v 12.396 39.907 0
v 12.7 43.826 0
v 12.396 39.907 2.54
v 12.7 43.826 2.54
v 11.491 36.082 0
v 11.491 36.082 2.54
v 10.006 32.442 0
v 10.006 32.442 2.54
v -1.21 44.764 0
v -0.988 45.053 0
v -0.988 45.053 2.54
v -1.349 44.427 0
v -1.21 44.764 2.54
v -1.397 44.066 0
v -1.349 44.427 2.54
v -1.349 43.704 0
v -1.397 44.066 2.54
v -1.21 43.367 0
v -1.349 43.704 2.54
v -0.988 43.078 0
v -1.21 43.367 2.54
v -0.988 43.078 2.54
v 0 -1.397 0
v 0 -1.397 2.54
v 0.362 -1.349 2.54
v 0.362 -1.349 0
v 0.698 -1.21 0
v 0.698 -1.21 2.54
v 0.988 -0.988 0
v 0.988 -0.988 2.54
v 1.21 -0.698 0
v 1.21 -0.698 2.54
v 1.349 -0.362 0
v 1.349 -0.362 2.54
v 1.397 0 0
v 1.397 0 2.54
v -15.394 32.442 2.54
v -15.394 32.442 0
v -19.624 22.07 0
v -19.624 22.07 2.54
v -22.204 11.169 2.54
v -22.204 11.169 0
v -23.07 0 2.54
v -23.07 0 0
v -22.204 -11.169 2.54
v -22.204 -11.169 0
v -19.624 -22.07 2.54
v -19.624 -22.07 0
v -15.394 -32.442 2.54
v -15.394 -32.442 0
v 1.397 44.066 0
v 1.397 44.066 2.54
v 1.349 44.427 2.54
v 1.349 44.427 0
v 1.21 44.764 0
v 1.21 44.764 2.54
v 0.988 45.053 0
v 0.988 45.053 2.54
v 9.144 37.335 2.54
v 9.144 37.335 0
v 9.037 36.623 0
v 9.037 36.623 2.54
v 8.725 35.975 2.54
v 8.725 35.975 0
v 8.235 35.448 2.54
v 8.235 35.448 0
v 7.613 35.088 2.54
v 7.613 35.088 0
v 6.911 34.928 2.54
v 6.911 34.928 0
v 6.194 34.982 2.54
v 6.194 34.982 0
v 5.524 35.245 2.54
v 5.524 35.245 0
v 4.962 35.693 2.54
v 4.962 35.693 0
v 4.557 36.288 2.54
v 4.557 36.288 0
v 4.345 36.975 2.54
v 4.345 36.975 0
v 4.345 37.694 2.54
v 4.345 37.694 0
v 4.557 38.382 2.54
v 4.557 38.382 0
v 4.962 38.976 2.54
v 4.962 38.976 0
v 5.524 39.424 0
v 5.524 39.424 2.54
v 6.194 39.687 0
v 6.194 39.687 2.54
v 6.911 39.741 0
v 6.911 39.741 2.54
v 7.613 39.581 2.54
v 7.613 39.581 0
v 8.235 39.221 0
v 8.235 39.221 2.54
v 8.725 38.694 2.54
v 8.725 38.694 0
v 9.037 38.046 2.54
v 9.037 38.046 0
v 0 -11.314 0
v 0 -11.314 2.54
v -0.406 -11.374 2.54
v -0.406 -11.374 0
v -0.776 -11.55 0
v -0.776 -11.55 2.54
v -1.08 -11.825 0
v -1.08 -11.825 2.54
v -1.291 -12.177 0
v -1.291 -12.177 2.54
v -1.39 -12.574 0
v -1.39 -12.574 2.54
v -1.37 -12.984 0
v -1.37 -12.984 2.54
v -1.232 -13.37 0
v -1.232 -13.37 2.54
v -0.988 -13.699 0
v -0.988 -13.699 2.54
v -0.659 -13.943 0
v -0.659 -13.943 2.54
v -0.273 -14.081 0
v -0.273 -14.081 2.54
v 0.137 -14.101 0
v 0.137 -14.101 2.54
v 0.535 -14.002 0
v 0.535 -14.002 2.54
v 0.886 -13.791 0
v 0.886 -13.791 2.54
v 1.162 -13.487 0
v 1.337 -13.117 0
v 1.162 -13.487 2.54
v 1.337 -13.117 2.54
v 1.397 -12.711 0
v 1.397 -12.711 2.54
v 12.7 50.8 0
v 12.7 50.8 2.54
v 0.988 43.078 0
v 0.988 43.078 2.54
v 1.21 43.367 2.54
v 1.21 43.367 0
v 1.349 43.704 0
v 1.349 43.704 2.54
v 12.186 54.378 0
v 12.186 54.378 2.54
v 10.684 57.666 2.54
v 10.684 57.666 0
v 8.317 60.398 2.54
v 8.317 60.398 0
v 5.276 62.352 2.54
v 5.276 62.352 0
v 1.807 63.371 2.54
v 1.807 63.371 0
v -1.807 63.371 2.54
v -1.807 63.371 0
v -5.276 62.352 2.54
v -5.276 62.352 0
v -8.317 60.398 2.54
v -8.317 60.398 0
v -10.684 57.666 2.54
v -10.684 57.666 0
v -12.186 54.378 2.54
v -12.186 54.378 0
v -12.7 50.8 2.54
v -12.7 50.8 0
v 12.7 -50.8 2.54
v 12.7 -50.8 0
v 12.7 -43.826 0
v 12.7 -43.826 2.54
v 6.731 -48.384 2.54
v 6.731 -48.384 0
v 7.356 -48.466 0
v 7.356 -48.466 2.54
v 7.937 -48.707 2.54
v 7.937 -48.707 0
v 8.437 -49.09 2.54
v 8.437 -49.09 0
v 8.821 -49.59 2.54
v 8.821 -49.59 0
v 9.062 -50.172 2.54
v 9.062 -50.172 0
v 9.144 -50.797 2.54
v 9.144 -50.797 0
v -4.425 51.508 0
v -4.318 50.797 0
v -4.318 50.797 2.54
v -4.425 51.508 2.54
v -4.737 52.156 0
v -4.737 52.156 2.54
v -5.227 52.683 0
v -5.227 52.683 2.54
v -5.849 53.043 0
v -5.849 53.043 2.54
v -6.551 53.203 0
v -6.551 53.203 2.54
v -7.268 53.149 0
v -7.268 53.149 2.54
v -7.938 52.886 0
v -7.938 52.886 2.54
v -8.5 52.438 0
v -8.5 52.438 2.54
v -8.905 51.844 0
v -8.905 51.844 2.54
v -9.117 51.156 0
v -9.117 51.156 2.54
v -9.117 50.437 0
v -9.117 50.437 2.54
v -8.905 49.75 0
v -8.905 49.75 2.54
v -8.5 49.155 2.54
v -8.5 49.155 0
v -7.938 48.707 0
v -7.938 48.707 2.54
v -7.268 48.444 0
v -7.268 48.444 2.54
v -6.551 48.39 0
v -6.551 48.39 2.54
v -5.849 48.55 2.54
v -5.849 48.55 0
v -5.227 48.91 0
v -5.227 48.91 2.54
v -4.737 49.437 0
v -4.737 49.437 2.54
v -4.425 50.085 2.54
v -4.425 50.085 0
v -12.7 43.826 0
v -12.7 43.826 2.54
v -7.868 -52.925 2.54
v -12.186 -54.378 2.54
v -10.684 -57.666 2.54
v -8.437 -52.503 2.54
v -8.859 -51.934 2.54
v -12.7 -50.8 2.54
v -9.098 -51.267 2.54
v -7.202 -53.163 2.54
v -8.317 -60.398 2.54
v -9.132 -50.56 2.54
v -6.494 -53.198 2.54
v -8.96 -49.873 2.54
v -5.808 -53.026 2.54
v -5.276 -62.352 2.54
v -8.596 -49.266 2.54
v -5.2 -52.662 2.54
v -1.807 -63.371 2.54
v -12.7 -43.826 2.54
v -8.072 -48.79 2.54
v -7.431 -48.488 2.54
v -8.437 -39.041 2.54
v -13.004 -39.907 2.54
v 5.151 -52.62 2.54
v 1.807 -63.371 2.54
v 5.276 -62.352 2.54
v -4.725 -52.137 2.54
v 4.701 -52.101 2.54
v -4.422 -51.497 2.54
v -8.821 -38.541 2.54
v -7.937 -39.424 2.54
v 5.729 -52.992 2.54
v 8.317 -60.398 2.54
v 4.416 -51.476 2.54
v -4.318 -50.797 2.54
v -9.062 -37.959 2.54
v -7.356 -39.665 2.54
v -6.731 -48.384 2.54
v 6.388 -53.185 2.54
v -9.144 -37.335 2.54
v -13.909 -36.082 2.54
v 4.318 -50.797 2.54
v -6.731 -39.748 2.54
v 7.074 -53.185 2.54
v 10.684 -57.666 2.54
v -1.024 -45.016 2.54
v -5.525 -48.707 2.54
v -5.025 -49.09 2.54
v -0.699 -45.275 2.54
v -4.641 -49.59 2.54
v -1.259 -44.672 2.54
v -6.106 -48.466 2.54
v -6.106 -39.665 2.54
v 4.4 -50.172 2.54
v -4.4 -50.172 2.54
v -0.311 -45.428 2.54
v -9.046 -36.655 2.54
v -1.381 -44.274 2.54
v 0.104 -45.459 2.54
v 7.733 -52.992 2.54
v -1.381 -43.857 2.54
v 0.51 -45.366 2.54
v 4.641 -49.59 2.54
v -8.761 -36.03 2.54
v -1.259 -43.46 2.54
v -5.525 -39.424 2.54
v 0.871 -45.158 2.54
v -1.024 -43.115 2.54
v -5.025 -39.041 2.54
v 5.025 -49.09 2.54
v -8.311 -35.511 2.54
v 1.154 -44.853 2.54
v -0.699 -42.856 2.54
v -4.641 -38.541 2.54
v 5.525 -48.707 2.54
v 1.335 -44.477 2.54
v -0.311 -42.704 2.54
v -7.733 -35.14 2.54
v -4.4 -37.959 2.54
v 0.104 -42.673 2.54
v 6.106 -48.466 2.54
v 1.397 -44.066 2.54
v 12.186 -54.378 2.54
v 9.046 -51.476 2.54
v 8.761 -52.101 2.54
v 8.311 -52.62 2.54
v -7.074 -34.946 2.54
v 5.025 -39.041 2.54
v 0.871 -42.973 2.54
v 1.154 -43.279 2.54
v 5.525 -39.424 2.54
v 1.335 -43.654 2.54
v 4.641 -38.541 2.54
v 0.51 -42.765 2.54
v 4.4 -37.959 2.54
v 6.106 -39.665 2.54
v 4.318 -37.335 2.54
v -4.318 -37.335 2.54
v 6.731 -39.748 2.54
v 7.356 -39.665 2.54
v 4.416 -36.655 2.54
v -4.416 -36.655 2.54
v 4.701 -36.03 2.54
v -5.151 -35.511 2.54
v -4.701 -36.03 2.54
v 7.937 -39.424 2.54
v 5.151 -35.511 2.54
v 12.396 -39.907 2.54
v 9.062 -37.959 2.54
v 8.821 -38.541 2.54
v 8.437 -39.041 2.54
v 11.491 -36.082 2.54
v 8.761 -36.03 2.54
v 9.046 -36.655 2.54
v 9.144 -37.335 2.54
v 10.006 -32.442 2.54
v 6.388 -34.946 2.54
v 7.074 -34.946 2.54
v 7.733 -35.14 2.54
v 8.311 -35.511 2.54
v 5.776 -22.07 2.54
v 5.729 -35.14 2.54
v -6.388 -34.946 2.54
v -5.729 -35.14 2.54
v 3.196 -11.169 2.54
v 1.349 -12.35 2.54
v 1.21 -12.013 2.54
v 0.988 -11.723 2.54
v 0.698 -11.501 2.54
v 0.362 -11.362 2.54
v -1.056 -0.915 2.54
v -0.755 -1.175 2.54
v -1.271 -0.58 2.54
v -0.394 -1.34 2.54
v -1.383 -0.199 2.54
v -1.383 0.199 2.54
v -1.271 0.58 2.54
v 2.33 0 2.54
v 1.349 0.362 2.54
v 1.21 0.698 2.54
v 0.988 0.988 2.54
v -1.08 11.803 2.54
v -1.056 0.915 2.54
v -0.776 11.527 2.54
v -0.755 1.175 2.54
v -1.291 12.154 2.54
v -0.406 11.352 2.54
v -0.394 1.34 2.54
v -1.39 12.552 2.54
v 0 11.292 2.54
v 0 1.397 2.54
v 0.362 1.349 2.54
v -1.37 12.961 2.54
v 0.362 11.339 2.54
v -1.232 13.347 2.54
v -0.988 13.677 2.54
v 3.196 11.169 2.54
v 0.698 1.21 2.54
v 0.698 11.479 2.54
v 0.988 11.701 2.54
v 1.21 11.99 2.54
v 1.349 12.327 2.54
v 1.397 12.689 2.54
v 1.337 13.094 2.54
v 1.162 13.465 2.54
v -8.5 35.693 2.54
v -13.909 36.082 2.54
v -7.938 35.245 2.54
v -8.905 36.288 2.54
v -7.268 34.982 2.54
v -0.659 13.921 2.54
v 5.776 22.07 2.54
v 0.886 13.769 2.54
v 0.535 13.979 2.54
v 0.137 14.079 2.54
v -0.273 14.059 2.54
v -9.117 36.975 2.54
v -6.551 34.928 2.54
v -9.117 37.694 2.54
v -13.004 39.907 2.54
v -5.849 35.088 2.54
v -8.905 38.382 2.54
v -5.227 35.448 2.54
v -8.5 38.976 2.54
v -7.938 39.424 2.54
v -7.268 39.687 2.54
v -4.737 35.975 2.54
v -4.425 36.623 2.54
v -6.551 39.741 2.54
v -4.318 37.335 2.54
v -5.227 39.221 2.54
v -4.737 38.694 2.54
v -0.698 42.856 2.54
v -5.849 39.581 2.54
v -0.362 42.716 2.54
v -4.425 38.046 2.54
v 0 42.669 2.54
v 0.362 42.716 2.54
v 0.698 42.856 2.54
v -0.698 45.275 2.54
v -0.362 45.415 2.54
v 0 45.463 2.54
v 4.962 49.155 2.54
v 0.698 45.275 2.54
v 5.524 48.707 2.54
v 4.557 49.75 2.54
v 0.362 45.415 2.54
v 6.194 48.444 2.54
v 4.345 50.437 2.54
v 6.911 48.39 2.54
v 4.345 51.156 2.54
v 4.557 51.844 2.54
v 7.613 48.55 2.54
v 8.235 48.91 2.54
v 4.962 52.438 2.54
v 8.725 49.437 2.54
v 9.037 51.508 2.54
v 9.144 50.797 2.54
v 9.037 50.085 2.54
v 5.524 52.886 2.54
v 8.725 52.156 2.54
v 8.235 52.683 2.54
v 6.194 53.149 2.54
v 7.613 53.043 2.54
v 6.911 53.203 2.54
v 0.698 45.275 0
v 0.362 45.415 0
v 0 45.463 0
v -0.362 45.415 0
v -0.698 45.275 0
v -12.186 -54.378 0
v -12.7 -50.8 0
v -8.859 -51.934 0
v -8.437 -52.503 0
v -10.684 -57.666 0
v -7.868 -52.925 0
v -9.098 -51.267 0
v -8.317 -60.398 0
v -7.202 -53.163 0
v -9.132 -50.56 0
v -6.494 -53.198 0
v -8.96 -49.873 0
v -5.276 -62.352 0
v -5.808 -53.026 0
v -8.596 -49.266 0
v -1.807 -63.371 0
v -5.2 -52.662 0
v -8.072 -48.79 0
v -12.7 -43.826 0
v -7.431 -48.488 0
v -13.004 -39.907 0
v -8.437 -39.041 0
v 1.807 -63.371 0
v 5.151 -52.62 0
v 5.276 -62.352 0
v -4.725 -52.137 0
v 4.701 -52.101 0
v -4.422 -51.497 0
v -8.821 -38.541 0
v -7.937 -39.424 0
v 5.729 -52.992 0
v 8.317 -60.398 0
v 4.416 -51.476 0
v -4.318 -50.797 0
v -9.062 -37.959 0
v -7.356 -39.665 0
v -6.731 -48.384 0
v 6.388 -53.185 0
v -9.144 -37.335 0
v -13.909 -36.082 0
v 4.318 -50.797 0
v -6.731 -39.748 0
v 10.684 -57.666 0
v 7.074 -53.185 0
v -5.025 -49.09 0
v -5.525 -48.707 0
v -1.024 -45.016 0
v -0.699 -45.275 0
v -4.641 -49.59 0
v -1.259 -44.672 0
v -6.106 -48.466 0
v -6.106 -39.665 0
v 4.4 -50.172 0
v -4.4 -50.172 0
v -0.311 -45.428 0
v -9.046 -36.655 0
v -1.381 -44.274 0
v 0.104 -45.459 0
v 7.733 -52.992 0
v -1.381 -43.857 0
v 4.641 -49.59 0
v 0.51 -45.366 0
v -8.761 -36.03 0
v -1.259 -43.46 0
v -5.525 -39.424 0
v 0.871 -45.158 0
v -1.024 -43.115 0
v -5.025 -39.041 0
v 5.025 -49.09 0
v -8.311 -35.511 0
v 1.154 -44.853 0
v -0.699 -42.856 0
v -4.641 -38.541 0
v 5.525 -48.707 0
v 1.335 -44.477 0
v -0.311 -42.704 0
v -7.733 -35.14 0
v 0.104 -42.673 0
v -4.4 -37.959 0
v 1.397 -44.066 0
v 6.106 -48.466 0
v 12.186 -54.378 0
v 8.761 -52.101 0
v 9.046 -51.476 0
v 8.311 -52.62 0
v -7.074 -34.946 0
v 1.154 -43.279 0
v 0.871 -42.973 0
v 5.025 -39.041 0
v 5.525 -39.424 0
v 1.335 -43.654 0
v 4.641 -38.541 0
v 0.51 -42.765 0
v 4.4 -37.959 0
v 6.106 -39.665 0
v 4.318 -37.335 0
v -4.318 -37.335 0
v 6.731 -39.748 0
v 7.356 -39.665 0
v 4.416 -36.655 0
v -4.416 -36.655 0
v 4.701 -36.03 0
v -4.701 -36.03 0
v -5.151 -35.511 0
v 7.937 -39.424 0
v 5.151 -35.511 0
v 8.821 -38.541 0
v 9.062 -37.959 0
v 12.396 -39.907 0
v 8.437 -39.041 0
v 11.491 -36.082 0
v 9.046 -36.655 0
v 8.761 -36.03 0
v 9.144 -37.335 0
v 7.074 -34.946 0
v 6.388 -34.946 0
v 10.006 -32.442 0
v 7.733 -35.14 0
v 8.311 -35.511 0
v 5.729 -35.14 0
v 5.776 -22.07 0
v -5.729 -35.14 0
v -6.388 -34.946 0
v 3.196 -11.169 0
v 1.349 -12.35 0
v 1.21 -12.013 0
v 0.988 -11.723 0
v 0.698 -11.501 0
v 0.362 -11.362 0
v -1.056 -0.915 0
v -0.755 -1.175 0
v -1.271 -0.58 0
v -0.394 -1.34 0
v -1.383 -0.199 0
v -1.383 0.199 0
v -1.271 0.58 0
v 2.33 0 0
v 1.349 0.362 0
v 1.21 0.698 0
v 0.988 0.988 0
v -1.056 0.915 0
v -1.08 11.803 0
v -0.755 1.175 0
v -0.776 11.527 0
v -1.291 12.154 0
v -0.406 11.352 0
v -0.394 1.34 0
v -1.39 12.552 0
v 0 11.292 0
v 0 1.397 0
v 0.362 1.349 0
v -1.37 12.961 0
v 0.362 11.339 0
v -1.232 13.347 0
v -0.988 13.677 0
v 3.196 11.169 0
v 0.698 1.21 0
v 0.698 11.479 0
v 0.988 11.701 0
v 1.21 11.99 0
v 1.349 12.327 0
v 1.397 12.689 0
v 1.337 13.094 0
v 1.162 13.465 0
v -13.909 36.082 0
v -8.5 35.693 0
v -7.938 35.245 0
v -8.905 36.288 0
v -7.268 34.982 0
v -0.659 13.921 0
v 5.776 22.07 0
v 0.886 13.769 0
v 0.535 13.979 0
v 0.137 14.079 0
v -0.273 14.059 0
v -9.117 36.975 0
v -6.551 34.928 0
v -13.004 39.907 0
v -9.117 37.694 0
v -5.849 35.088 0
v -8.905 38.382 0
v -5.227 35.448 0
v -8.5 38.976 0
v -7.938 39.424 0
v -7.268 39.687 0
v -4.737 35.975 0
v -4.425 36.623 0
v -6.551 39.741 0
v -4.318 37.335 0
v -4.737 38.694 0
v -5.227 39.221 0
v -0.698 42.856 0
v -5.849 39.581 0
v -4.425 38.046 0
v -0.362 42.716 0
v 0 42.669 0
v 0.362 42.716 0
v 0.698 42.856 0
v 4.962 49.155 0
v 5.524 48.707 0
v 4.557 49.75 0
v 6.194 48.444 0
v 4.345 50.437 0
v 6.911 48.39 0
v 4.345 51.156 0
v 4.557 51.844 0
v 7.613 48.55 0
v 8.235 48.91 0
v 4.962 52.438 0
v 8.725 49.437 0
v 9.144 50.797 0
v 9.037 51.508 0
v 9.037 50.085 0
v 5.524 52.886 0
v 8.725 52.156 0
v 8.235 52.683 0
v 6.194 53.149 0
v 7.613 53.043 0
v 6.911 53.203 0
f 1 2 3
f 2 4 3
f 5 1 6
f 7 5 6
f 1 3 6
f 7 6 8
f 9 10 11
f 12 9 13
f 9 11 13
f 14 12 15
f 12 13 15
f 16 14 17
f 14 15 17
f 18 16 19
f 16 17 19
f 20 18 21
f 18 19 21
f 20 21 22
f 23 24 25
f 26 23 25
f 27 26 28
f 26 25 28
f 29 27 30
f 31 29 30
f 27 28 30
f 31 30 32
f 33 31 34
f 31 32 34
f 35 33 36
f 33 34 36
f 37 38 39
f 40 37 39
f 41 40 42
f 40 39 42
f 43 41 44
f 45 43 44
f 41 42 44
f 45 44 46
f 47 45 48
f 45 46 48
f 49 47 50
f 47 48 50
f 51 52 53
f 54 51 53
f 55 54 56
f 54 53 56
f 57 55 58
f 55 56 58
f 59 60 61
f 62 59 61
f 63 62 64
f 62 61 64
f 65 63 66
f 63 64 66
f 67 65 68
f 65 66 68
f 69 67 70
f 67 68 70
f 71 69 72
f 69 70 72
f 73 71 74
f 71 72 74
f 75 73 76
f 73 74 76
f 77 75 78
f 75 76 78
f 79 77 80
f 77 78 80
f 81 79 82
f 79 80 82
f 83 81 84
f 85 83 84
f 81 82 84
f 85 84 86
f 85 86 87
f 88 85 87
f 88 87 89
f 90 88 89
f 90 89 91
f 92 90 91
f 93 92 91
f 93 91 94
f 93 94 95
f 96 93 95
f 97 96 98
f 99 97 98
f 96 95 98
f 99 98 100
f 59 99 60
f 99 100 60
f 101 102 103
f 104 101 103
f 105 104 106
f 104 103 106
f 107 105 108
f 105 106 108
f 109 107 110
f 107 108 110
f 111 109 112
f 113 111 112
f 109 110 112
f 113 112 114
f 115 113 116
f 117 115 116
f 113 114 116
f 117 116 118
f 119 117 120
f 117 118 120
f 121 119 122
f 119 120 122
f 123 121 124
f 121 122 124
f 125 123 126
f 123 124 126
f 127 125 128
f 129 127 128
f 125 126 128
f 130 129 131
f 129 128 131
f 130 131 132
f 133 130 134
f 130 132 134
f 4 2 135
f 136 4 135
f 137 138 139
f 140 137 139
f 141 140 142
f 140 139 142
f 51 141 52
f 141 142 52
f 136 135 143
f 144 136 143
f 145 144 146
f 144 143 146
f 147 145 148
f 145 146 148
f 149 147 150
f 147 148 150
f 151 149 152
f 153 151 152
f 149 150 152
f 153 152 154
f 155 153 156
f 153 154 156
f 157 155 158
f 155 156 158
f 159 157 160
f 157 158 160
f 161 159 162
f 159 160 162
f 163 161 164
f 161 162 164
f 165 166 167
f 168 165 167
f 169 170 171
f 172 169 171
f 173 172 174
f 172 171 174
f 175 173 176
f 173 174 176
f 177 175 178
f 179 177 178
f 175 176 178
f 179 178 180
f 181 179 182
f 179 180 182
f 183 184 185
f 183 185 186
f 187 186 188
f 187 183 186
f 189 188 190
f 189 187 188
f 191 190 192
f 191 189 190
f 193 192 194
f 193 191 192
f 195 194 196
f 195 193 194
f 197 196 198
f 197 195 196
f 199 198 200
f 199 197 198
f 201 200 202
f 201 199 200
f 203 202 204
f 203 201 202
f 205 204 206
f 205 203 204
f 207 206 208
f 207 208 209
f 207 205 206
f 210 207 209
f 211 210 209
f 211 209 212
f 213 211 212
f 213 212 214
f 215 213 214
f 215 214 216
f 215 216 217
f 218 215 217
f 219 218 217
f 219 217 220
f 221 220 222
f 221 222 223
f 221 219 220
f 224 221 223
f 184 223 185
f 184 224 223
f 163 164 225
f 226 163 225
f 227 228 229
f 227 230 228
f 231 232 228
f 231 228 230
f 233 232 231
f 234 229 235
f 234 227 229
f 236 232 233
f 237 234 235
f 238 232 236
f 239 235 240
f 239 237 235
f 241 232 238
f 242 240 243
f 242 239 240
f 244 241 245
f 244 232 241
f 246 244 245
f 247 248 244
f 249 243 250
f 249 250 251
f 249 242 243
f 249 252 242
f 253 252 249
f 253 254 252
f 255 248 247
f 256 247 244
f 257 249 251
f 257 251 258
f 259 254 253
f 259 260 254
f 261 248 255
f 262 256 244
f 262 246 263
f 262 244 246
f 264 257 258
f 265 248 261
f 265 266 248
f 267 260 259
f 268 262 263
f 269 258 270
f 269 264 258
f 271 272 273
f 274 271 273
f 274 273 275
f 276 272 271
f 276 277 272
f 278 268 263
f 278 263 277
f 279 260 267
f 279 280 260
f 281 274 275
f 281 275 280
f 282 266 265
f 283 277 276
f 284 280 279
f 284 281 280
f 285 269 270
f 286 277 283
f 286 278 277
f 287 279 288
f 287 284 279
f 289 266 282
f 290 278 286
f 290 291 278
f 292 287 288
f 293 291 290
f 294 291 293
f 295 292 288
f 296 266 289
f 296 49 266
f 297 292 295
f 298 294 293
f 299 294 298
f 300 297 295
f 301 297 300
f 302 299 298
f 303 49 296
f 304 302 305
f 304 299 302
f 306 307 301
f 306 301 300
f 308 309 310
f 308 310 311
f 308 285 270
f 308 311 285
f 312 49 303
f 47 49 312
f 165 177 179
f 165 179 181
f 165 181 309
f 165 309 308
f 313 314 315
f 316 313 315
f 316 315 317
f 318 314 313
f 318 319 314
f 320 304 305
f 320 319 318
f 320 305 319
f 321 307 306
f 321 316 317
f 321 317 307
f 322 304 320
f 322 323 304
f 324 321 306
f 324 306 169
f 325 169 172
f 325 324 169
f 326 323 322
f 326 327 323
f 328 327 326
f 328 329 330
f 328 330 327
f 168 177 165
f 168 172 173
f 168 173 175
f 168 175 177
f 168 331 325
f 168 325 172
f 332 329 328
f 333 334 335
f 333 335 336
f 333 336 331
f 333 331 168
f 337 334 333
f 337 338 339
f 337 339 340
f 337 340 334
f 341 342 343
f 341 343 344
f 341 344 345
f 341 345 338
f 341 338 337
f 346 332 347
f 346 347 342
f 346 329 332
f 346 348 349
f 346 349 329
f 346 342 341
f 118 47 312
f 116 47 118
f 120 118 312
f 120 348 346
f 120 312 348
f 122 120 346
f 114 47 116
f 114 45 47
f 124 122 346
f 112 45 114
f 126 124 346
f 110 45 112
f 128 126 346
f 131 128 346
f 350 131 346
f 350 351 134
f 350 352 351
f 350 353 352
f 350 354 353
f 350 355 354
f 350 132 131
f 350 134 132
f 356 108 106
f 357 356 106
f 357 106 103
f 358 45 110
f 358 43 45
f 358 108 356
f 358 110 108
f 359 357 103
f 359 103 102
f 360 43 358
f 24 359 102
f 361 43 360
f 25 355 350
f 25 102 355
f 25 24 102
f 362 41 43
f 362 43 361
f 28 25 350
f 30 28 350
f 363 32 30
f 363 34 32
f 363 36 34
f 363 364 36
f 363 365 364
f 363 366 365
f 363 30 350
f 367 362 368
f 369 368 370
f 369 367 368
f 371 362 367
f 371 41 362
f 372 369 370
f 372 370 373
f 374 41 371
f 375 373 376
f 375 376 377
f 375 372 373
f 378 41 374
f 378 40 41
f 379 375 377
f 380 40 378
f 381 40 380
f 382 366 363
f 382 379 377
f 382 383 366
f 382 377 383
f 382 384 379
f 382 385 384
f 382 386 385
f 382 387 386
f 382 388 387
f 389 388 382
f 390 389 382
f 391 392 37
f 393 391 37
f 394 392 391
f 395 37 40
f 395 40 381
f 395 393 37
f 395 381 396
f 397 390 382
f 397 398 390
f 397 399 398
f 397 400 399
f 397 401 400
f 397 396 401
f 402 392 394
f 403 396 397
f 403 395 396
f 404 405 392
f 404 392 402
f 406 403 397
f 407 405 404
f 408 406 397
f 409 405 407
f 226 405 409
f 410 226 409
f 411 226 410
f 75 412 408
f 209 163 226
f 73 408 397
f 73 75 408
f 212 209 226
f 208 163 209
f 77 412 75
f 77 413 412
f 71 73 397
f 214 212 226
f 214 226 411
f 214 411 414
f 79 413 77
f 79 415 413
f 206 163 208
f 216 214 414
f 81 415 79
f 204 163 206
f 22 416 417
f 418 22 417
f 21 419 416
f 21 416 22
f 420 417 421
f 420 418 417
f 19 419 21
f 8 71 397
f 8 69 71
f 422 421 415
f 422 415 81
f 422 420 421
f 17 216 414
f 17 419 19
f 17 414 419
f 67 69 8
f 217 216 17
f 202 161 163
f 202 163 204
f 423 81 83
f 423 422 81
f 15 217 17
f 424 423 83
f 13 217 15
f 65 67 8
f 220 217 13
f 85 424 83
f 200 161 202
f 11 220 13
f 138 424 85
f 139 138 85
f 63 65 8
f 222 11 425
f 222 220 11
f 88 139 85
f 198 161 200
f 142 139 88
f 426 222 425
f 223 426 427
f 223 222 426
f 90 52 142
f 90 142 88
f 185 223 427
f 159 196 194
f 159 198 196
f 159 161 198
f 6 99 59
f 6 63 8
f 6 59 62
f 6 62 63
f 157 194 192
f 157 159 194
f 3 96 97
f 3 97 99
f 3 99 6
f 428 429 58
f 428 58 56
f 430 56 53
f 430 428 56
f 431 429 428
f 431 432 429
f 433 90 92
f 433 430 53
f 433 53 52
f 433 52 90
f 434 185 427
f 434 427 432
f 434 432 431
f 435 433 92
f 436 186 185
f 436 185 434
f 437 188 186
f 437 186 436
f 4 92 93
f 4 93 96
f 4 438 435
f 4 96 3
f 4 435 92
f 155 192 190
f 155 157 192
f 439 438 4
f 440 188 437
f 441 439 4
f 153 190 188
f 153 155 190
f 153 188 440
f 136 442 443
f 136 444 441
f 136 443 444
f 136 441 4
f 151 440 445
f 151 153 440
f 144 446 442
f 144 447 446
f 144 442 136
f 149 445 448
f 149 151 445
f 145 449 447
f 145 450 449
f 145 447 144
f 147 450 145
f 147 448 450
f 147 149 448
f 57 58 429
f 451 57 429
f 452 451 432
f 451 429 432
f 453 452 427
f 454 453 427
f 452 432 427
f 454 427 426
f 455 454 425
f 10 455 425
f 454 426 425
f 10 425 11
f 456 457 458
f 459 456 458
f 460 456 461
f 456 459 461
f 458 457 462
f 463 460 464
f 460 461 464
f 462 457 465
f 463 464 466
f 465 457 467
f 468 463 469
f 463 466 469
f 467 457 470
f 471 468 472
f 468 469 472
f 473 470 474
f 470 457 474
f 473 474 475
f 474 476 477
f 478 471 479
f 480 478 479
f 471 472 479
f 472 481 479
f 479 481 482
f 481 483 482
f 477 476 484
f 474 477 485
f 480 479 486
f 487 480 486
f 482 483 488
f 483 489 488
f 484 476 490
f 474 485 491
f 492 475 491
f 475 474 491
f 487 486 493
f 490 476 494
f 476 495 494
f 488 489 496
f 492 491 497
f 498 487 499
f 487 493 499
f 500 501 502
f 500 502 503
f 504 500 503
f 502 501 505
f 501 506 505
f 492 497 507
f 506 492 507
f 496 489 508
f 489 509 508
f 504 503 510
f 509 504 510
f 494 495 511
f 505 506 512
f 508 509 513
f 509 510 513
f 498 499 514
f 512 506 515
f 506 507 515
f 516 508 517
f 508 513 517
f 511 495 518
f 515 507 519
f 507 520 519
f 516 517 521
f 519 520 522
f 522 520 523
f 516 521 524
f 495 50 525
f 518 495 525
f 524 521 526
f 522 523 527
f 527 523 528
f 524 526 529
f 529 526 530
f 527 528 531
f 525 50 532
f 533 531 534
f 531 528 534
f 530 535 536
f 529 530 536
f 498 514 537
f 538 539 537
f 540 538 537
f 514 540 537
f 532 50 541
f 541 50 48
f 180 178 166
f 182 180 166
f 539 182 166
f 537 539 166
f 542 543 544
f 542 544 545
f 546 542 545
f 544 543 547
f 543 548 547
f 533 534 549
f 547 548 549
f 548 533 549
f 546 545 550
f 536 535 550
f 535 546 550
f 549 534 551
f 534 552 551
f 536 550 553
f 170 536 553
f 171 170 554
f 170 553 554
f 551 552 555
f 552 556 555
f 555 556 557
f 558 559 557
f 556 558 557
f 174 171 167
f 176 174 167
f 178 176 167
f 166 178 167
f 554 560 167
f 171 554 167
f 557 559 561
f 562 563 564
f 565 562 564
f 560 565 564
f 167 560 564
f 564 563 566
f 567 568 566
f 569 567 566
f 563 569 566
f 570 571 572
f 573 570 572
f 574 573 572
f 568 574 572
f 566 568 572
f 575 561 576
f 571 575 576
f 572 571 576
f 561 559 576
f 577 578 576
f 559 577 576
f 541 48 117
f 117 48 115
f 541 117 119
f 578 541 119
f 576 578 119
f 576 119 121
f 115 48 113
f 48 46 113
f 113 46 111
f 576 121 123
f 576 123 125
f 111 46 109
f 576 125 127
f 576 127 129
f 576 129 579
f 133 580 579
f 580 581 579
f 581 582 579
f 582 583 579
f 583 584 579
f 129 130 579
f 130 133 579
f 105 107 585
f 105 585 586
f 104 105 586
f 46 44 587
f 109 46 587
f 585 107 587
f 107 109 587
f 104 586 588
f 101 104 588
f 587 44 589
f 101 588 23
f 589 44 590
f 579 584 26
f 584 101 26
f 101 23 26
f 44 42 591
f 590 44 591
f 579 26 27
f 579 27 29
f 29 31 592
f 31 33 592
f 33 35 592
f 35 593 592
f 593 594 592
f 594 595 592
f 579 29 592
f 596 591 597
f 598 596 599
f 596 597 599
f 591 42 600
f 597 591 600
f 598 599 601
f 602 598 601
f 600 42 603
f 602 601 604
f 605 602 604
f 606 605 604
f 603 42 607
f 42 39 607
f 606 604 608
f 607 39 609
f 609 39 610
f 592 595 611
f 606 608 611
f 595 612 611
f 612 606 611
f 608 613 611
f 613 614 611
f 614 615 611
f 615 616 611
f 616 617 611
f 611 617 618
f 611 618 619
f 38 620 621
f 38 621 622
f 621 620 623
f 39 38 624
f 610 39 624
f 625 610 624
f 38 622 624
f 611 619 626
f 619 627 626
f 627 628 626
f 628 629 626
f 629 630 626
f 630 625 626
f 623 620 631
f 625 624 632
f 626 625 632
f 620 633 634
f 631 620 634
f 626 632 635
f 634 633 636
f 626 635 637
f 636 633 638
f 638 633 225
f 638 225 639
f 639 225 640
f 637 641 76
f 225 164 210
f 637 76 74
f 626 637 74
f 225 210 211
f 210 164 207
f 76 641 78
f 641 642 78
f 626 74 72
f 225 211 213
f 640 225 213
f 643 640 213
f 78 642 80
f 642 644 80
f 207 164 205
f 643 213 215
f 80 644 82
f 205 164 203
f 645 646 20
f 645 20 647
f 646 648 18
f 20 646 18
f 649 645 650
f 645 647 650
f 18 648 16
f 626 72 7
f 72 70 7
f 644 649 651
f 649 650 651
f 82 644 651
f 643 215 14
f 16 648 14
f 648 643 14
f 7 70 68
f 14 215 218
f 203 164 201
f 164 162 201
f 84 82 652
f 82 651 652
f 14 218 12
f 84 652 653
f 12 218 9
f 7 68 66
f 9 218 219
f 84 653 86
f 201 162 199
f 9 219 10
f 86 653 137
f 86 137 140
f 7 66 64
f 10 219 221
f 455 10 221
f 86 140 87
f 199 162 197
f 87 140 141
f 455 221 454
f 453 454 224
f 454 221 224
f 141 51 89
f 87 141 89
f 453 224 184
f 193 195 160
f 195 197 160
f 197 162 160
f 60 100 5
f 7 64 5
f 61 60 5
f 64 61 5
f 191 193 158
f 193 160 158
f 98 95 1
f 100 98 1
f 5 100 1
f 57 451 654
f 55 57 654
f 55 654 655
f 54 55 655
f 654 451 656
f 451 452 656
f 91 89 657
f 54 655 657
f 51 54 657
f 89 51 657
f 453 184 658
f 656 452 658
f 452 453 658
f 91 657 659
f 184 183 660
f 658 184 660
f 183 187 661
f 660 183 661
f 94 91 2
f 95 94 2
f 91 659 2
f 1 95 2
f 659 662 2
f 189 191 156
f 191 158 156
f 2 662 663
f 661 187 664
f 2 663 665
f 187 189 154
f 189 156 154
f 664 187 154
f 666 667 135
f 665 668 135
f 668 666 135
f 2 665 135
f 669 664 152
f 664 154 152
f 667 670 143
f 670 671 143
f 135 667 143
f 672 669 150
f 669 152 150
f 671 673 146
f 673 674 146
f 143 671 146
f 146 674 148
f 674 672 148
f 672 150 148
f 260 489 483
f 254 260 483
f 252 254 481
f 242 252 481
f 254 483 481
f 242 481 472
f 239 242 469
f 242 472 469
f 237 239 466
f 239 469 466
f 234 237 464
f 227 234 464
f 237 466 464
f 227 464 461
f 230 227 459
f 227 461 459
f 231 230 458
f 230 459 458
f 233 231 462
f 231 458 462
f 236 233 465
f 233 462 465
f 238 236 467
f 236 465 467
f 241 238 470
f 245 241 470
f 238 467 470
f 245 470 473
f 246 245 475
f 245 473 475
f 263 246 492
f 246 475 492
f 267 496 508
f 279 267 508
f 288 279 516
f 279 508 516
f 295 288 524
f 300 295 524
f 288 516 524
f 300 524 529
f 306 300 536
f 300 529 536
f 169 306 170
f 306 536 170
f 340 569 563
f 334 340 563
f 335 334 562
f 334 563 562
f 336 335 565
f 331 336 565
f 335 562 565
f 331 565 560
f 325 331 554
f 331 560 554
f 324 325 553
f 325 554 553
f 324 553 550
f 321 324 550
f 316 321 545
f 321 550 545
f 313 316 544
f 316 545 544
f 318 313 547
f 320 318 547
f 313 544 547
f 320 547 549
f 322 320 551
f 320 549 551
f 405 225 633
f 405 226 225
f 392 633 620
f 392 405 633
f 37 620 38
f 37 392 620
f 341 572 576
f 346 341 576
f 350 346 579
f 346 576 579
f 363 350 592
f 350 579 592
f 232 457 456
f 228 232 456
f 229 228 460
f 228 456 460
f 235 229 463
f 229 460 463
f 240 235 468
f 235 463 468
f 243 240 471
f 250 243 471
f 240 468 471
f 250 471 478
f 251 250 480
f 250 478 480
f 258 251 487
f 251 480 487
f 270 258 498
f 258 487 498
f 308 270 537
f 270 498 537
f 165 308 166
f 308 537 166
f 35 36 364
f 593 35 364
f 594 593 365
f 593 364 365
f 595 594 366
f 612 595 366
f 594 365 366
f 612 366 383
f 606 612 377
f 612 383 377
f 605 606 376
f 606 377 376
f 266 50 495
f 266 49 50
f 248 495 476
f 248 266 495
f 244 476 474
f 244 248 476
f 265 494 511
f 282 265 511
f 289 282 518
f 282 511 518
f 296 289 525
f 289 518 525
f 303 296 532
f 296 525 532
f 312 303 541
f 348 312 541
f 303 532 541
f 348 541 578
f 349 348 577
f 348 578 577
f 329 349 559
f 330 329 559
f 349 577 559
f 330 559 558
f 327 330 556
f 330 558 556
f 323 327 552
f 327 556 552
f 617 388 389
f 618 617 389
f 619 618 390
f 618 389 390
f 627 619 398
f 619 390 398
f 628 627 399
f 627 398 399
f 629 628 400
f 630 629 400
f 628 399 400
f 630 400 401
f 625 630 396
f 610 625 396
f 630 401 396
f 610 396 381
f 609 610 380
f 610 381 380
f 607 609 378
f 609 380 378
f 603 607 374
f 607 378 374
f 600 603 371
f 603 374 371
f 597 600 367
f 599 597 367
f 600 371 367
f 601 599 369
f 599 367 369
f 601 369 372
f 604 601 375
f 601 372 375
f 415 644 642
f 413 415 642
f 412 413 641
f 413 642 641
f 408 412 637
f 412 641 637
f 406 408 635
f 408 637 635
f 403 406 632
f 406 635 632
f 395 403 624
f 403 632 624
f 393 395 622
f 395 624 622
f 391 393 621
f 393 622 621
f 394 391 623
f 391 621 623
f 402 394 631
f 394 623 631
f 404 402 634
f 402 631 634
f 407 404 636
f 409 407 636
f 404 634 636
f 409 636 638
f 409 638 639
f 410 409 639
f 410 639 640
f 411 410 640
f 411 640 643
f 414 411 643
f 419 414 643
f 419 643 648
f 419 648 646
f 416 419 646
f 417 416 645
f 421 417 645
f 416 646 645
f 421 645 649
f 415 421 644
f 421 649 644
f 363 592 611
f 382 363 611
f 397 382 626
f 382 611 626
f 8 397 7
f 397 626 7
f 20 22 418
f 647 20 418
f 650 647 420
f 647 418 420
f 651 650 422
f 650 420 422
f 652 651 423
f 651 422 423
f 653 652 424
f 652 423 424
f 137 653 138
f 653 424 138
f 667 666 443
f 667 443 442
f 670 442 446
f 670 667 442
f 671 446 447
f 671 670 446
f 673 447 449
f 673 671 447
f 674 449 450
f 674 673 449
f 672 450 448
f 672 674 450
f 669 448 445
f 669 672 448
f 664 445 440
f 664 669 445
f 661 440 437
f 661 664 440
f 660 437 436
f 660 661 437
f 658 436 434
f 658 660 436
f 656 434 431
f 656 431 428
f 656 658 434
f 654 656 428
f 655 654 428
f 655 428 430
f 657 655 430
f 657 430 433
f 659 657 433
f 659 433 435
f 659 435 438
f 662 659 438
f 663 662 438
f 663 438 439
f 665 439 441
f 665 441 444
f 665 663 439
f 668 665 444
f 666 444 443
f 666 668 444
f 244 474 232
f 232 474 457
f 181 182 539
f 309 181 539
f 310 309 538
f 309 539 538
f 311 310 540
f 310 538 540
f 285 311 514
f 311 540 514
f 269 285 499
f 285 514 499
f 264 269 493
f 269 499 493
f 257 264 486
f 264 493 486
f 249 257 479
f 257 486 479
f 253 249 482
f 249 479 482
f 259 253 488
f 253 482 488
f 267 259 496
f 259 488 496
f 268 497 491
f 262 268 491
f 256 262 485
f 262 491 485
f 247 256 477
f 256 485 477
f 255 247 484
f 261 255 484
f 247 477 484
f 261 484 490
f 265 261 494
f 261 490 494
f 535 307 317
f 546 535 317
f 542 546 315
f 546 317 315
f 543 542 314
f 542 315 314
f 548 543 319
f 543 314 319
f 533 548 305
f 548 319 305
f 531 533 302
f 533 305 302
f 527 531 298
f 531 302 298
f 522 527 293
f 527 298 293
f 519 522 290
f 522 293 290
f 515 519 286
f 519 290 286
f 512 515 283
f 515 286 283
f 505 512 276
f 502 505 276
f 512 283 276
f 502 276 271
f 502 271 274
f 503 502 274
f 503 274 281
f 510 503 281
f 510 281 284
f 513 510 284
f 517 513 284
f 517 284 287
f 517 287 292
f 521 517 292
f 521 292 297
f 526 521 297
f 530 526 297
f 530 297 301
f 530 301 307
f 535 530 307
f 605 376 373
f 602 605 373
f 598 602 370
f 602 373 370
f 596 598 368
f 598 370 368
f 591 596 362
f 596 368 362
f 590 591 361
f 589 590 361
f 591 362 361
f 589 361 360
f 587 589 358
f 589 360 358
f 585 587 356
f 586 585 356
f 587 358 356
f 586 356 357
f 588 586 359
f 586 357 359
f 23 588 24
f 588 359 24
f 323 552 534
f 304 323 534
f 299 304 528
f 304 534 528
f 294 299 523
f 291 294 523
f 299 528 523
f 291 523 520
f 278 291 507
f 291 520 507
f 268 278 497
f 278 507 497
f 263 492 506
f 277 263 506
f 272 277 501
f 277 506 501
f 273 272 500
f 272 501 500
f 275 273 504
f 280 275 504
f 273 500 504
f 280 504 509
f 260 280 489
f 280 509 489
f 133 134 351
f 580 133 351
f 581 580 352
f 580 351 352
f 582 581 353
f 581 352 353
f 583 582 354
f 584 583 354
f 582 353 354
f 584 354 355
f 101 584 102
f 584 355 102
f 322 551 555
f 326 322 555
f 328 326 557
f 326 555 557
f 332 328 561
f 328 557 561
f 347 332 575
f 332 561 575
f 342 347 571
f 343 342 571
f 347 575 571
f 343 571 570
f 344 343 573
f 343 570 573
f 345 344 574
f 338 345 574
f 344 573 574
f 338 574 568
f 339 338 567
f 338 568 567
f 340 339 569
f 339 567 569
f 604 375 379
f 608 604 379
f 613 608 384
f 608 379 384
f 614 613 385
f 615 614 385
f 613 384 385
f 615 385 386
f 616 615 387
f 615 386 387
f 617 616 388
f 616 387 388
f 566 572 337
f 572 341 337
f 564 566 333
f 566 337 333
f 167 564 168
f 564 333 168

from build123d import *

# Parameters (mm, degrees)
F0_R     = 2.413
F1_DEPTH = 2.54
F2_R     = 1.397
F3_DEPTH = 2.541
F4_R     = 25.4


with BuildPart() as f1:
    # F0 (on Top) → F1 (new body)
    with BuildSketch(Plane.XY):
        with BuildLine():
            Line((12.7, 37.3346617284), (12.7, 50.8))
            ThreePointArc((12.7, 50.8), (0, 63.5), (-12.7, 50.8))
            Line((-12.7, 50.8), (-12.7, 37.3346617284))
            Line((-12.7, 37.3346617284), (-9.144, 37.3346617284))
            ThreePointArc((-9.144, 37.3346617284), (-6.731, 39.7476617284), (-4.318, 37.3346617284))
            Line((-4.318, 37.3346617284), (4.318, 37.3346617284))
            ThreePointArc((4.318, 37.3346617284), (6.731, 39.7476617284), (9.144, 37.3346617284))
            Line((9.144, 37.3346617284), (12.7, 37.3346617284))
        make_face()
        with Locations((-6.731, 50.7966617284)):
            Circle(F0_R, mode=Mode.SUBTRACT)
        with Locations((6.731, 50.7966617284)):
            Circle(F0_R, mode=Mode.SUBTRACT)
        with BuildLine():
            ThreePointArc((2.3296350653, 0), (4.9703931971, 19.3740898835), (12.7, 37.3346617284))
            Line((12.7, 37.3346617284), (9.144, 37.3346617284))
            ThreePointArc((9.144, 37.3346617284), (6.731, 34.9216617284), (4.318, 37.3346617284))
            Line((4.318, 37.3346617284), (-4.318, 37.3346617284))
            ThreePointArc((-4.318, 37.3346617284), (-6.731, 34.9216617284), (-9.144, 37.3346617284))
            Line((-9.144, 37.3346617284), (-12.7, 37.3346617284))
            Line((-12.7, 37.3346617284), (-12.7, -37.3346617284))
            Line((-12.7, -37.3346617284), (-9.144, -37.3346617284))
            ThreePointArc((-9.144, -37.3346617284), (-6.731, -34.9216617284), (-4.318, -37.3346617284))
            Line((-4.318, -37.3346617284), (4.318, -37.3346617284))
            ThreePointArc((4.318, -37.3346617284), (6.731, -34.9216617284), (9.144, -37.3346617284))
            Line((9.144, -37.3346617284), (12.7, -37.3346617284))
            ThreePointArc((12.7, -37.3346617284), (4.9703931971, -19.3740898835), (2.3296350653, 0))
        make_face()
        with BuildLine():
            Line((-12.7, -37.3346617284), (-12.7, 37.3346617284))
            ThreePointArc((-12.7, 37.3346617284), (-23.0703649347, 0), (-12.7, -37.3346617284))
        make_face()
        with BuildLine():
            Line((12.7, -50.8), (12.7, -37.3346617284))
            Line((12.7, -37.3346617284), (9.144, -37.3346617284))
            ThreePointArc((9.144, -37.3346617284), (8.437248663, -39.0409103914), (6.731, -39.7476617284))
            Line((6.731, -39.7476617284), (6.731, -48.3836617284))
            ThreePointArc((6.731, -48.3836617284), (8.437248663, -49.0904130654), (9.144, -50.7966617284))
            ThreePointArc((9.144, -50.7966617284), (6.731, -53.2096617284), (4.318, -50.7966617284))
            Line((4.318, -50.7966617284), (-4.318, -50.7966617284))
            ThreePointArc((-4.318, -50.7966617284), (-8.437248663, -52.5029103914), (-6.731, -48.3836617284))
            Line((-6.731, -48.3836617284), (-6.731, -39.7476617284))
            ThreePointArc((-6.731, -39.7476617284), (-8.437248663, -39.0409103914), (-9.144, -37.3346617284))
            Line((-9.144, -37.3346617284), (-12.7, -37.3346617284))
            Line((-12.7, -37.3346617284), (-12.7, -50.8))
            ThreePointArc((-12.7, -50.8), (0, -63.5), (12.7, -50.8))
        make_face()
        with BuildLine():
            ThreePointArc((6.731, -39.7476617284), (5.024751337, -39.0409103914), (4.318, -37.3346617284))
            Line((4.318, -37.3346617284), (-4.318, -37.3346617284))
            ThreePointArc((-4.318, -37.3346617284), (-5.024751337, -39.0409103914), (-6.731, -39.7476617284))
            Line((-6.731, -39.7476617284), (-6.731, -48.3836617284))
            ThreePointArc((-6.731, -48.3836617284), (-5.024751337, -49.0904130654), (-4.318, -50.7966617284))
            Line((-4.318, -50.7966617284), (4.318, -50.7966617284))
            ThreePointArc((4.318, -50.7966617284), (5.024751337, -49.0904130654), (6.731, -48.3836617284))
            Line((6.731, -48.3836617284), (6.731, -39.7476617284))
        make_face()
    extrude(amount=F1_DEPTH)

    # F2 (on face) → F3 (cut, through all)
    with BuildSketch(Plane.XY.offset(2.54)):
        with BuildLine():
            ThreePointArc((0, -1.397), (0.9878281733, -0.9878281733), (1.397, 0))
            ThreePointArc((1.397, 0), (0.9878281733, 0.9878281733), (0, 1.397))
            Line((0, 1.397), (0, -1.397))
        make_face()
        with BuildLine():
            ThreePointArc((1.397, -12.7112130487), (0.9878281733, -11.7233848754), (0, -11.3142130487))
            ThreePointArc((0, -11.3142130487), (-0.9878281733, -13.699041222), (1.397, -12.7112130487))
        make_face()
        with BuildLine():
            ThreePointArc((1.397, 12.6887869513), (-0.9878281733, 13.6766151246), (0, 11.2917869513))
            ThreePointArc((0, 11.2917869513), (0.9878281733, 11.700958778), (1.397, 12.6887869513))
        make_face()
        with BuildLine():
            Line((0, -1.397), (0, 1.397))
            ThreePointArc((0, 1.397), (-1.397, 0), (0, -1.397))
        make_face()
        with BuildLine():
            ThreePointArc((0.9878281733, 45.0534899017), (0, 45.4626617284), (-0.9878281733, 45.0534899017))
            Line((-0.9878281733, 45.0534899017), (0, 44.0656617284))
            Line((0, 44.0656617284), (0.9878281733, 45.0534899017))
        make_face()
        with BuildLine():
            Line((0, 44.0656617284), (-0.9878281733, 45.0534899017))
            ThreePointArc((-0.9878281733, 45.0534899017), (-1.397, 44.0656617284), (-0.9878281733, 43.0778335551))
            Line((-0.9878281733, 43.0778335551), (0, 44.0656617284))
        make_face()
        with BuildLine():
            Line((0.9878281733, 45.0534899017), (0, 44.0656617284))
            Line((0, 44.0656617284), (0.9878281733, 43.0778335551))
            ThreePointArc((0.9878281733, 43.0778335551), (1.2906597069, 43.5310529734), (1.397, 44.0656617284))
            ThreePointArc((1.397, 44.0656617284), (1.2906597069, 44.6002704834), (0.9878281733, 45.0534899017))
        make_face()
        with BuildLine():
            Line((0.9878281733, 43.0778335551), (0, 44.0656617284))
            Line((0, 44.0656617284), (-0.9878281733, 43.0778335551))
            ThreePointArc((-0.9878281733, 43.0778335551), (0, 42.6686617284), (0.9878281733, 43.0778335551))
        make_face()
        with Locations((0, -44.0656617284)):
            Circle(F2_R)
    extrude(amount=-F3_DEPTH, mode=Mode.SUBTRACT)

    # F4
    f4_edges = [f1.edges().sort_by_distance(p)[0] for p in [
        (12.7, 37.334662, 1.27),
        (12.7, -37.334662, 1.27),
        (-12.7, 37.334662, 1.27),
        (-12.7, -37.334662, 1.27),
    ]]
    fillet(f4_edges, radius=F4_R)


solid = f1.part
